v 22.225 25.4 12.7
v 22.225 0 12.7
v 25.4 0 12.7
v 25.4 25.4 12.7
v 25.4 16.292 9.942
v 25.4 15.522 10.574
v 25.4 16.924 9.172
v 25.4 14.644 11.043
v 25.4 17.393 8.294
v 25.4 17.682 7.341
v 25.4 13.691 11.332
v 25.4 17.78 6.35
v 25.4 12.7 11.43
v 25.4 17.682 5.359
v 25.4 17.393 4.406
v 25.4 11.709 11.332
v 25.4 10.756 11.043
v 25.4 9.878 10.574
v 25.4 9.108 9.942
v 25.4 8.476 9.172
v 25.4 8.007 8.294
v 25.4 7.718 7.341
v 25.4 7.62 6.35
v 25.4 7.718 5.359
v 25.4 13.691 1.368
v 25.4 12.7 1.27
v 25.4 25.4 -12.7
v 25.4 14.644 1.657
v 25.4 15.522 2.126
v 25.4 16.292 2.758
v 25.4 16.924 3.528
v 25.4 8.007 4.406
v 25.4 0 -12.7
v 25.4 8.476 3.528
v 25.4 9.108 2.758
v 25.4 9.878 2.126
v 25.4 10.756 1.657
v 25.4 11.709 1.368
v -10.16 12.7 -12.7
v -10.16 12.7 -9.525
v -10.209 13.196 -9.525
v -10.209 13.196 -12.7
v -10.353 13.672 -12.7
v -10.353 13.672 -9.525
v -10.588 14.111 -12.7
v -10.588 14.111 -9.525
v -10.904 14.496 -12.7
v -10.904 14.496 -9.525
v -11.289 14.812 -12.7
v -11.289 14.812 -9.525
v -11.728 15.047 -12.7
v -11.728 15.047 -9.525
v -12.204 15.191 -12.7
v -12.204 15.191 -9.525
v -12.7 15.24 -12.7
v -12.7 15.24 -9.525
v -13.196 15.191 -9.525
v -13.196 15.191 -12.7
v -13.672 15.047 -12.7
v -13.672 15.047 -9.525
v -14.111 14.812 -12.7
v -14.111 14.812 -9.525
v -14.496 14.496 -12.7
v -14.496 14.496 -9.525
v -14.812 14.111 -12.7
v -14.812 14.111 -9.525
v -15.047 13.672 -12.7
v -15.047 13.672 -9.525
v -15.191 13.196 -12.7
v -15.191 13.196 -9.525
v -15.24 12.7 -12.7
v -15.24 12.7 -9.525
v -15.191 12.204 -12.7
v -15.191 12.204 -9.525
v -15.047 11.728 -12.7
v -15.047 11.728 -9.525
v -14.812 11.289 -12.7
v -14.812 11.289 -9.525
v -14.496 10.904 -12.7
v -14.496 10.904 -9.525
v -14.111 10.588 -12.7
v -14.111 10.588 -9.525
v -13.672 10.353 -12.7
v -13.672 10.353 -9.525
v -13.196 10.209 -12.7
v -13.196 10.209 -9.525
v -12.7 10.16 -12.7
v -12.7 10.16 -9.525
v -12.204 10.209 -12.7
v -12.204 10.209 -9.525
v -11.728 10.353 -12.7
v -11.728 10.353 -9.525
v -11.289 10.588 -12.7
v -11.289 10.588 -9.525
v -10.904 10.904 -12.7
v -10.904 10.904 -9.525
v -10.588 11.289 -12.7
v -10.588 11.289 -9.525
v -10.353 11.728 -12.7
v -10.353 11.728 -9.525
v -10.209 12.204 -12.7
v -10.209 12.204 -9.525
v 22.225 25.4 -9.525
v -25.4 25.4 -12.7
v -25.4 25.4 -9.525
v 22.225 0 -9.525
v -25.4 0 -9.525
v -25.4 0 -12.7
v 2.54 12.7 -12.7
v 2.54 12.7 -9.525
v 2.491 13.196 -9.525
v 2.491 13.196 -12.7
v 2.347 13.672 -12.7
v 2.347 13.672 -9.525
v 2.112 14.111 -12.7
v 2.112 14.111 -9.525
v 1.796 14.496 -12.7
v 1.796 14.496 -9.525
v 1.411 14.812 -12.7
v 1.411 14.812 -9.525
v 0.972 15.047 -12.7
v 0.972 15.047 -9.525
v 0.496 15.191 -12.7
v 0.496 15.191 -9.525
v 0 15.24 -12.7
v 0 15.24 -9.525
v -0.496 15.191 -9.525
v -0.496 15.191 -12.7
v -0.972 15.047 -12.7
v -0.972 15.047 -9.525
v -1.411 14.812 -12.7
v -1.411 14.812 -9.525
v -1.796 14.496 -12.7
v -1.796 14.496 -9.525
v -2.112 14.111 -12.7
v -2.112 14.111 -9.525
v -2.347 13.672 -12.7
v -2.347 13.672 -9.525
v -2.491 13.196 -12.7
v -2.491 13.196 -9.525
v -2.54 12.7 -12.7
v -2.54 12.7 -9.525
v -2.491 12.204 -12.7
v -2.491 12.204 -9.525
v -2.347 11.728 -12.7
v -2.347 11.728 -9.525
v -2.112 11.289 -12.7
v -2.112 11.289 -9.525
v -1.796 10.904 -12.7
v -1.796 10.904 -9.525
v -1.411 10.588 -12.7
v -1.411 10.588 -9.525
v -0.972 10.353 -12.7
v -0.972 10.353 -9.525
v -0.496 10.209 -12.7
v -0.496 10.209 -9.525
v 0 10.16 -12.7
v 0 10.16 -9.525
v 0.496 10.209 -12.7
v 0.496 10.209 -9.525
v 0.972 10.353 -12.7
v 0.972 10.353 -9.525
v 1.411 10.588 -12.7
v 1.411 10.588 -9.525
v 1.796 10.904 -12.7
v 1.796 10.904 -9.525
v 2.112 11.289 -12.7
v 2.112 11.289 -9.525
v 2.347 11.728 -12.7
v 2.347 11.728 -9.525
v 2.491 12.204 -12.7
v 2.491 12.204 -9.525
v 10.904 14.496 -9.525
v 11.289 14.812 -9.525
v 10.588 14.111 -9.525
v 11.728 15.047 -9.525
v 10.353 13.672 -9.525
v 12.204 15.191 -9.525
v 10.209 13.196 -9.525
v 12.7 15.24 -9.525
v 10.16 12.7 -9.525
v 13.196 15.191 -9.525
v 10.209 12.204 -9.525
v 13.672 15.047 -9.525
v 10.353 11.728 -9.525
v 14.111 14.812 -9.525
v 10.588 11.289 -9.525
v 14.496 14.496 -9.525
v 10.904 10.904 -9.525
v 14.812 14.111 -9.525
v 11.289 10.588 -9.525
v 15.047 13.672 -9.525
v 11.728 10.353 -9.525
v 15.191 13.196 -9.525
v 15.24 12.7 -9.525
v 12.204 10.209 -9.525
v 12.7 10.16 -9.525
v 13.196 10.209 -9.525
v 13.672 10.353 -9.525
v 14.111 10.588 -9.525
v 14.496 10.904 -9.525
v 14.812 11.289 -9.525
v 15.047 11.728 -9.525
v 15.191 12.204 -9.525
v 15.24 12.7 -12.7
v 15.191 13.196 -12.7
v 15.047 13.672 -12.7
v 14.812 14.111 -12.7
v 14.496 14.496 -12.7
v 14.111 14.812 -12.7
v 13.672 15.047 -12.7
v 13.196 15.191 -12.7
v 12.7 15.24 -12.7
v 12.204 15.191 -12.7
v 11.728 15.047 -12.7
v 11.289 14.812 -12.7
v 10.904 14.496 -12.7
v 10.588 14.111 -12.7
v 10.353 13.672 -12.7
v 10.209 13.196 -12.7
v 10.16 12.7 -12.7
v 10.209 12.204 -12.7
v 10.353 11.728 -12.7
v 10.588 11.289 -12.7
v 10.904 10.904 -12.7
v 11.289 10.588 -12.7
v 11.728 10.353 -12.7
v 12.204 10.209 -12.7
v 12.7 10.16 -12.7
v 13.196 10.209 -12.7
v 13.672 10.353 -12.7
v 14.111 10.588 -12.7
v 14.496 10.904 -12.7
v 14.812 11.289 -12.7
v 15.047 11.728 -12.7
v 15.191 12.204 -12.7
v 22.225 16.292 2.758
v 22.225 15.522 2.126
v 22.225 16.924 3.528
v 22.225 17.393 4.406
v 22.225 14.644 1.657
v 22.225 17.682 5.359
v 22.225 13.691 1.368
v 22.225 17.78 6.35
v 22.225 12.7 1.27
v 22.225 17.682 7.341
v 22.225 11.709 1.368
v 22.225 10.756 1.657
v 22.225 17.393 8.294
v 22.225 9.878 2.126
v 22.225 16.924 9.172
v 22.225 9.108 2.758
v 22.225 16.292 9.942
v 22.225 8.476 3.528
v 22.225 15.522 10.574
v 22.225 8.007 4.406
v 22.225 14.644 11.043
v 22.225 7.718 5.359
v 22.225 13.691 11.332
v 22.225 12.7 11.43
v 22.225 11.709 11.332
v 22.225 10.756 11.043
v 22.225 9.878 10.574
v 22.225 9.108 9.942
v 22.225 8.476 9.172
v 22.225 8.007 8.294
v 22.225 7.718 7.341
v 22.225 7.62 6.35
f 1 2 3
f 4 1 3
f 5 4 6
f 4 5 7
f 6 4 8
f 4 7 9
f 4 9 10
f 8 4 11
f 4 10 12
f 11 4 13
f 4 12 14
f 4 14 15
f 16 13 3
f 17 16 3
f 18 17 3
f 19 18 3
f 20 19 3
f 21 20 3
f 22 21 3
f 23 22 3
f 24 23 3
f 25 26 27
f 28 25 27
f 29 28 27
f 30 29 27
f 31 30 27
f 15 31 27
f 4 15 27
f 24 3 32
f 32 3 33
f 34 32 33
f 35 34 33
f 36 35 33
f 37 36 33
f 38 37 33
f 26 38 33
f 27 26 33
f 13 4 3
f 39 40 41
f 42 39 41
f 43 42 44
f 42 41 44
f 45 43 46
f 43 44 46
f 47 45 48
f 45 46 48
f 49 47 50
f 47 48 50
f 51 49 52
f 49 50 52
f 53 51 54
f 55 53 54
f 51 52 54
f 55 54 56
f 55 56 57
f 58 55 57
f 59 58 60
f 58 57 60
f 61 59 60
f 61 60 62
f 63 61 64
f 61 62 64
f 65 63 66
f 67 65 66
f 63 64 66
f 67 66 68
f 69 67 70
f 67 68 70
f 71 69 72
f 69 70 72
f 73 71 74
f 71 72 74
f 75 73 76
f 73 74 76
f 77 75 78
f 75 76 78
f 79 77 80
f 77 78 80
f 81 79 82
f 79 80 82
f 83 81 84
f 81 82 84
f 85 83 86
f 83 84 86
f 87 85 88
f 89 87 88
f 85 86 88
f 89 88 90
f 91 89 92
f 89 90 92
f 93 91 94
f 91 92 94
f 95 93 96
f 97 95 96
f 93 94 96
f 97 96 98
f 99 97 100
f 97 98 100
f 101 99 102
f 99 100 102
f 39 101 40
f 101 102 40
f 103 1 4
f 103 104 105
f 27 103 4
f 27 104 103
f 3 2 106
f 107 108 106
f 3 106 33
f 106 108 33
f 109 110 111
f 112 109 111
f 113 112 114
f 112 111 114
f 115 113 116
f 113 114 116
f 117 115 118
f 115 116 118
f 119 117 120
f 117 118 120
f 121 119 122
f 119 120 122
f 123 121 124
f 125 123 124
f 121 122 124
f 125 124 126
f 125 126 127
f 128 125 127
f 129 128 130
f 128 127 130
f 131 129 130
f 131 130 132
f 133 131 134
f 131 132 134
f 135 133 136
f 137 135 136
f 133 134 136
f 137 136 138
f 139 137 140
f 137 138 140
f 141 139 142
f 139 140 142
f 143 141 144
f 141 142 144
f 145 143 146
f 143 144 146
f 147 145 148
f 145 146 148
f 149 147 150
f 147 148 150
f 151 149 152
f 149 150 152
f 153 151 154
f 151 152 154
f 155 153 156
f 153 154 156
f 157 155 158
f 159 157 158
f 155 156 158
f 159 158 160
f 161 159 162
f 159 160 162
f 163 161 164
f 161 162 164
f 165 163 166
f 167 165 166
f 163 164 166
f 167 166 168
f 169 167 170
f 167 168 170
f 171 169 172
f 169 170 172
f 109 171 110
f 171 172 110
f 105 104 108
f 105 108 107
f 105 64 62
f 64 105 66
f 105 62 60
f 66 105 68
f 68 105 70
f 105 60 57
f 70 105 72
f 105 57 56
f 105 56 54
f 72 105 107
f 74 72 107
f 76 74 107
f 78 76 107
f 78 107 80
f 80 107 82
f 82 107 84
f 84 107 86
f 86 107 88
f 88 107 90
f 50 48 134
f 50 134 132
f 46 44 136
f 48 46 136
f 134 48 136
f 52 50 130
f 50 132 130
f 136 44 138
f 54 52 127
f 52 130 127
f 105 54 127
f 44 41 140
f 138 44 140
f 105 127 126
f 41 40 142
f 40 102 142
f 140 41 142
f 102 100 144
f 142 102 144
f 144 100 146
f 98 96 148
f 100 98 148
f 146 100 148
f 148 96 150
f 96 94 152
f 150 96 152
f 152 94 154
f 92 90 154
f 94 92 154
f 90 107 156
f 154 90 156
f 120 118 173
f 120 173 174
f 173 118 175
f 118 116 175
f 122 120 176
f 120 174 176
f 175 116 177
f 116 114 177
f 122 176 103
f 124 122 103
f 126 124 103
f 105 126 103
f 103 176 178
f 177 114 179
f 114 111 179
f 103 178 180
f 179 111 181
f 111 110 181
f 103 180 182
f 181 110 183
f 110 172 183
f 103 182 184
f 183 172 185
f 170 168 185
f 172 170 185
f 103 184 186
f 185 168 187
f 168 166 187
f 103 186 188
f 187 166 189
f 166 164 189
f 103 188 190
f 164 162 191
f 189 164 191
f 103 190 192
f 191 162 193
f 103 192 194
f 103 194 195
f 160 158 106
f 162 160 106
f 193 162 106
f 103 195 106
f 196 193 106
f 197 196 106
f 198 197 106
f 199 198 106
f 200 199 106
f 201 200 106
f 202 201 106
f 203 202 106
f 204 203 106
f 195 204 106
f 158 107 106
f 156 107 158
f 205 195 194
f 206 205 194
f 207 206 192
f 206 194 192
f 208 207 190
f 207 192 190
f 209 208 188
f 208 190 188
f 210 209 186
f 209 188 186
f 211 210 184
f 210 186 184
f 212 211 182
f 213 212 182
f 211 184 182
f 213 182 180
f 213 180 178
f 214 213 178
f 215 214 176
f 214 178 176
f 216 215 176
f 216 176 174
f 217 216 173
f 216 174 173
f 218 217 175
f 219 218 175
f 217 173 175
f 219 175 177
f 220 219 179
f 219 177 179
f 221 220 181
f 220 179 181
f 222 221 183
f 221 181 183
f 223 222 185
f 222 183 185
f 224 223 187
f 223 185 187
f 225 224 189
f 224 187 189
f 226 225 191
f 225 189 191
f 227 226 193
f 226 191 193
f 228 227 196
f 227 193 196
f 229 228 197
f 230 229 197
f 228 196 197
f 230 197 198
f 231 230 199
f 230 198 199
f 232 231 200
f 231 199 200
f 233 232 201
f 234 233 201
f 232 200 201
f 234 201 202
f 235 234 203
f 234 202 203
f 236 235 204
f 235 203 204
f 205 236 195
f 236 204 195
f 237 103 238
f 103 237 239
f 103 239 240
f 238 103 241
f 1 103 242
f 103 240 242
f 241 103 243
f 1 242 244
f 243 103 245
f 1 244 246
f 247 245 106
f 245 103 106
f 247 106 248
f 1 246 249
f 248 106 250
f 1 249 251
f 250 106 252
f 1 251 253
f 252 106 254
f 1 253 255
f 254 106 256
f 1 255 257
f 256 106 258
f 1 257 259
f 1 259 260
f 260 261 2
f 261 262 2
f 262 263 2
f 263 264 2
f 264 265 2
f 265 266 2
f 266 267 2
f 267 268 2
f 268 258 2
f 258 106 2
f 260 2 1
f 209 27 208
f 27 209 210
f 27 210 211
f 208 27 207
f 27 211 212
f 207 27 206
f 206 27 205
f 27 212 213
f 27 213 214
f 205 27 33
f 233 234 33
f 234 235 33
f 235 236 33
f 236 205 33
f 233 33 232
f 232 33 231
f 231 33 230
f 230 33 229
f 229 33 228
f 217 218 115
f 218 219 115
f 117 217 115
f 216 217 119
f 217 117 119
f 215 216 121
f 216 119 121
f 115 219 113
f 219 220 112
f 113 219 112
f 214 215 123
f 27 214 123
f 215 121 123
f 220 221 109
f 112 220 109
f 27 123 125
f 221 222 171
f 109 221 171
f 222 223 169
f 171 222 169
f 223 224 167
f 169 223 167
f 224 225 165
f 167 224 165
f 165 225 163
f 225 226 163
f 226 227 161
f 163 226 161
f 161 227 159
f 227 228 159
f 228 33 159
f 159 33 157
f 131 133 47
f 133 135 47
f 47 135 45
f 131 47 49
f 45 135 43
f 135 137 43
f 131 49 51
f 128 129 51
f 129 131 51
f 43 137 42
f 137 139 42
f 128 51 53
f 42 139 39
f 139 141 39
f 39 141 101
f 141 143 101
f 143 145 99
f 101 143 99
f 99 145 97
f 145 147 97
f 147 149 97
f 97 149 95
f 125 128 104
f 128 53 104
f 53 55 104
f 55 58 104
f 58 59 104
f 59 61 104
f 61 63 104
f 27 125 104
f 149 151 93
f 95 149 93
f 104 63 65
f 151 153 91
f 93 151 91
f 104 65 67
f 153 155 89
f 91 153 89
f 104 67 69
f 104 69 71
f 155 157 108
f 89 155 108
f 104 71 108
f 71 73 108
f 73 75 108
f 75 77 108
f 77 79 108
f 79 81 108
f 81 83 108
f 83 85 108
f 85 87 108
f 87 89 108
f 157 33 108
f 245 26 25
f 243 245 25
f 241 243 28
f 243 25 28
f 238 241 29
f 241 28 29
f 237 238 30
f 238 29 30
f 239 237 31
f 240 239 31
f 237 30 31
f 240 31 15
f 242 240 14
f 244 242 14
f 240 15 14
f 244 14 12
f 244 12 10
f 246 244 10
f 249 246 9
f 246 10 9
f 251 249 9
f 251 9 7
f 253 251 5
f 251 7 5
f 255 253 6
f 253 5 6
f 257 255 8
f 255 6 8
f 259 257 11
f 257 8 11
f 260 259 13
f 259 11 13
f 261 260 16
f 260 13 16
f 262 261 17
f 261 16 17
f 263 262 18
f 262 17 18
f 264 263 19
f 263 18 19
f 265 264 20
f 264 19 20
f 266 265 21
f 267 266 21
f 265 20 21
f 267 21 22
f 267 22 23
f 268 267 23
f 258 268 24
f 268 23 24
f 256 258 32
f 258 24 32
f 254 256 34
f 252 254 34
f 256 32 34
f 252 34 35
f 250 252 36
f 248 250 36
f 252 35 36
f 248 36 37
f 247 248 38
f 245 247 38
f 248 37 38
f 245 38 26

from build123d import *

# Parameters (mm, degrees)
BOSS_EXTRUDE1_DEPTH = 25.4
SKETCH2_R           = 5.08
CUT_EXTRUDE1_DEPTH  = 3.175
SKETCH3_R           = 2.54
CUT_EXTRUDE2_DEPTH  = 3.175


with BuildPart() as part:
    # Sketch1 → Boss-Extrude1 (new body)
    with BuildSketch(Plane(origin=(0, 0, 0), x_dir=(1, 0, 0), z_dir=(0, 1, 0))):
        Polygon((22.225, 9.525), (22.225, -12.7), (25.4, -12.7), (25.4, 12.7), (-25.4, 12.7), (-25.4, 9.525), align=None)
    extrude(amount=BOSS_EXTRUDE1_DEPTH)

    # Sketch2 → Cut-Extrude1 (cut)
    with BuildSketch(Plane(origin=(25.4, 0, 0), x_dir=(0, 0, -1), z_dir=(1, 0, 0))):
        with Locations((-6.35, 12.7)):
            Circle(SKETCH2_R)
    extrude(amount=-CUT_EXTRUDE1_DEPTH, mode=Mode.SUBTRACT)

    # Sketch3 → Cut-Extrude2 (cut)
    with BuildSketch(Plane.XY.offset(-9.525)):
        with Locations((-12.7, 12.7)):
            Circle(SKETCH3_R)
        with Locations((0, 12.7)):
            Circle(SKETCH3_R)
        with Locations((12.7, 12.7)):
            Circle(SKETCH3_R)
    extrude(amount=-CUT_EXTRUDE2_DEPTH, mode=Mode.SUBTRACT)


solid = part.part
